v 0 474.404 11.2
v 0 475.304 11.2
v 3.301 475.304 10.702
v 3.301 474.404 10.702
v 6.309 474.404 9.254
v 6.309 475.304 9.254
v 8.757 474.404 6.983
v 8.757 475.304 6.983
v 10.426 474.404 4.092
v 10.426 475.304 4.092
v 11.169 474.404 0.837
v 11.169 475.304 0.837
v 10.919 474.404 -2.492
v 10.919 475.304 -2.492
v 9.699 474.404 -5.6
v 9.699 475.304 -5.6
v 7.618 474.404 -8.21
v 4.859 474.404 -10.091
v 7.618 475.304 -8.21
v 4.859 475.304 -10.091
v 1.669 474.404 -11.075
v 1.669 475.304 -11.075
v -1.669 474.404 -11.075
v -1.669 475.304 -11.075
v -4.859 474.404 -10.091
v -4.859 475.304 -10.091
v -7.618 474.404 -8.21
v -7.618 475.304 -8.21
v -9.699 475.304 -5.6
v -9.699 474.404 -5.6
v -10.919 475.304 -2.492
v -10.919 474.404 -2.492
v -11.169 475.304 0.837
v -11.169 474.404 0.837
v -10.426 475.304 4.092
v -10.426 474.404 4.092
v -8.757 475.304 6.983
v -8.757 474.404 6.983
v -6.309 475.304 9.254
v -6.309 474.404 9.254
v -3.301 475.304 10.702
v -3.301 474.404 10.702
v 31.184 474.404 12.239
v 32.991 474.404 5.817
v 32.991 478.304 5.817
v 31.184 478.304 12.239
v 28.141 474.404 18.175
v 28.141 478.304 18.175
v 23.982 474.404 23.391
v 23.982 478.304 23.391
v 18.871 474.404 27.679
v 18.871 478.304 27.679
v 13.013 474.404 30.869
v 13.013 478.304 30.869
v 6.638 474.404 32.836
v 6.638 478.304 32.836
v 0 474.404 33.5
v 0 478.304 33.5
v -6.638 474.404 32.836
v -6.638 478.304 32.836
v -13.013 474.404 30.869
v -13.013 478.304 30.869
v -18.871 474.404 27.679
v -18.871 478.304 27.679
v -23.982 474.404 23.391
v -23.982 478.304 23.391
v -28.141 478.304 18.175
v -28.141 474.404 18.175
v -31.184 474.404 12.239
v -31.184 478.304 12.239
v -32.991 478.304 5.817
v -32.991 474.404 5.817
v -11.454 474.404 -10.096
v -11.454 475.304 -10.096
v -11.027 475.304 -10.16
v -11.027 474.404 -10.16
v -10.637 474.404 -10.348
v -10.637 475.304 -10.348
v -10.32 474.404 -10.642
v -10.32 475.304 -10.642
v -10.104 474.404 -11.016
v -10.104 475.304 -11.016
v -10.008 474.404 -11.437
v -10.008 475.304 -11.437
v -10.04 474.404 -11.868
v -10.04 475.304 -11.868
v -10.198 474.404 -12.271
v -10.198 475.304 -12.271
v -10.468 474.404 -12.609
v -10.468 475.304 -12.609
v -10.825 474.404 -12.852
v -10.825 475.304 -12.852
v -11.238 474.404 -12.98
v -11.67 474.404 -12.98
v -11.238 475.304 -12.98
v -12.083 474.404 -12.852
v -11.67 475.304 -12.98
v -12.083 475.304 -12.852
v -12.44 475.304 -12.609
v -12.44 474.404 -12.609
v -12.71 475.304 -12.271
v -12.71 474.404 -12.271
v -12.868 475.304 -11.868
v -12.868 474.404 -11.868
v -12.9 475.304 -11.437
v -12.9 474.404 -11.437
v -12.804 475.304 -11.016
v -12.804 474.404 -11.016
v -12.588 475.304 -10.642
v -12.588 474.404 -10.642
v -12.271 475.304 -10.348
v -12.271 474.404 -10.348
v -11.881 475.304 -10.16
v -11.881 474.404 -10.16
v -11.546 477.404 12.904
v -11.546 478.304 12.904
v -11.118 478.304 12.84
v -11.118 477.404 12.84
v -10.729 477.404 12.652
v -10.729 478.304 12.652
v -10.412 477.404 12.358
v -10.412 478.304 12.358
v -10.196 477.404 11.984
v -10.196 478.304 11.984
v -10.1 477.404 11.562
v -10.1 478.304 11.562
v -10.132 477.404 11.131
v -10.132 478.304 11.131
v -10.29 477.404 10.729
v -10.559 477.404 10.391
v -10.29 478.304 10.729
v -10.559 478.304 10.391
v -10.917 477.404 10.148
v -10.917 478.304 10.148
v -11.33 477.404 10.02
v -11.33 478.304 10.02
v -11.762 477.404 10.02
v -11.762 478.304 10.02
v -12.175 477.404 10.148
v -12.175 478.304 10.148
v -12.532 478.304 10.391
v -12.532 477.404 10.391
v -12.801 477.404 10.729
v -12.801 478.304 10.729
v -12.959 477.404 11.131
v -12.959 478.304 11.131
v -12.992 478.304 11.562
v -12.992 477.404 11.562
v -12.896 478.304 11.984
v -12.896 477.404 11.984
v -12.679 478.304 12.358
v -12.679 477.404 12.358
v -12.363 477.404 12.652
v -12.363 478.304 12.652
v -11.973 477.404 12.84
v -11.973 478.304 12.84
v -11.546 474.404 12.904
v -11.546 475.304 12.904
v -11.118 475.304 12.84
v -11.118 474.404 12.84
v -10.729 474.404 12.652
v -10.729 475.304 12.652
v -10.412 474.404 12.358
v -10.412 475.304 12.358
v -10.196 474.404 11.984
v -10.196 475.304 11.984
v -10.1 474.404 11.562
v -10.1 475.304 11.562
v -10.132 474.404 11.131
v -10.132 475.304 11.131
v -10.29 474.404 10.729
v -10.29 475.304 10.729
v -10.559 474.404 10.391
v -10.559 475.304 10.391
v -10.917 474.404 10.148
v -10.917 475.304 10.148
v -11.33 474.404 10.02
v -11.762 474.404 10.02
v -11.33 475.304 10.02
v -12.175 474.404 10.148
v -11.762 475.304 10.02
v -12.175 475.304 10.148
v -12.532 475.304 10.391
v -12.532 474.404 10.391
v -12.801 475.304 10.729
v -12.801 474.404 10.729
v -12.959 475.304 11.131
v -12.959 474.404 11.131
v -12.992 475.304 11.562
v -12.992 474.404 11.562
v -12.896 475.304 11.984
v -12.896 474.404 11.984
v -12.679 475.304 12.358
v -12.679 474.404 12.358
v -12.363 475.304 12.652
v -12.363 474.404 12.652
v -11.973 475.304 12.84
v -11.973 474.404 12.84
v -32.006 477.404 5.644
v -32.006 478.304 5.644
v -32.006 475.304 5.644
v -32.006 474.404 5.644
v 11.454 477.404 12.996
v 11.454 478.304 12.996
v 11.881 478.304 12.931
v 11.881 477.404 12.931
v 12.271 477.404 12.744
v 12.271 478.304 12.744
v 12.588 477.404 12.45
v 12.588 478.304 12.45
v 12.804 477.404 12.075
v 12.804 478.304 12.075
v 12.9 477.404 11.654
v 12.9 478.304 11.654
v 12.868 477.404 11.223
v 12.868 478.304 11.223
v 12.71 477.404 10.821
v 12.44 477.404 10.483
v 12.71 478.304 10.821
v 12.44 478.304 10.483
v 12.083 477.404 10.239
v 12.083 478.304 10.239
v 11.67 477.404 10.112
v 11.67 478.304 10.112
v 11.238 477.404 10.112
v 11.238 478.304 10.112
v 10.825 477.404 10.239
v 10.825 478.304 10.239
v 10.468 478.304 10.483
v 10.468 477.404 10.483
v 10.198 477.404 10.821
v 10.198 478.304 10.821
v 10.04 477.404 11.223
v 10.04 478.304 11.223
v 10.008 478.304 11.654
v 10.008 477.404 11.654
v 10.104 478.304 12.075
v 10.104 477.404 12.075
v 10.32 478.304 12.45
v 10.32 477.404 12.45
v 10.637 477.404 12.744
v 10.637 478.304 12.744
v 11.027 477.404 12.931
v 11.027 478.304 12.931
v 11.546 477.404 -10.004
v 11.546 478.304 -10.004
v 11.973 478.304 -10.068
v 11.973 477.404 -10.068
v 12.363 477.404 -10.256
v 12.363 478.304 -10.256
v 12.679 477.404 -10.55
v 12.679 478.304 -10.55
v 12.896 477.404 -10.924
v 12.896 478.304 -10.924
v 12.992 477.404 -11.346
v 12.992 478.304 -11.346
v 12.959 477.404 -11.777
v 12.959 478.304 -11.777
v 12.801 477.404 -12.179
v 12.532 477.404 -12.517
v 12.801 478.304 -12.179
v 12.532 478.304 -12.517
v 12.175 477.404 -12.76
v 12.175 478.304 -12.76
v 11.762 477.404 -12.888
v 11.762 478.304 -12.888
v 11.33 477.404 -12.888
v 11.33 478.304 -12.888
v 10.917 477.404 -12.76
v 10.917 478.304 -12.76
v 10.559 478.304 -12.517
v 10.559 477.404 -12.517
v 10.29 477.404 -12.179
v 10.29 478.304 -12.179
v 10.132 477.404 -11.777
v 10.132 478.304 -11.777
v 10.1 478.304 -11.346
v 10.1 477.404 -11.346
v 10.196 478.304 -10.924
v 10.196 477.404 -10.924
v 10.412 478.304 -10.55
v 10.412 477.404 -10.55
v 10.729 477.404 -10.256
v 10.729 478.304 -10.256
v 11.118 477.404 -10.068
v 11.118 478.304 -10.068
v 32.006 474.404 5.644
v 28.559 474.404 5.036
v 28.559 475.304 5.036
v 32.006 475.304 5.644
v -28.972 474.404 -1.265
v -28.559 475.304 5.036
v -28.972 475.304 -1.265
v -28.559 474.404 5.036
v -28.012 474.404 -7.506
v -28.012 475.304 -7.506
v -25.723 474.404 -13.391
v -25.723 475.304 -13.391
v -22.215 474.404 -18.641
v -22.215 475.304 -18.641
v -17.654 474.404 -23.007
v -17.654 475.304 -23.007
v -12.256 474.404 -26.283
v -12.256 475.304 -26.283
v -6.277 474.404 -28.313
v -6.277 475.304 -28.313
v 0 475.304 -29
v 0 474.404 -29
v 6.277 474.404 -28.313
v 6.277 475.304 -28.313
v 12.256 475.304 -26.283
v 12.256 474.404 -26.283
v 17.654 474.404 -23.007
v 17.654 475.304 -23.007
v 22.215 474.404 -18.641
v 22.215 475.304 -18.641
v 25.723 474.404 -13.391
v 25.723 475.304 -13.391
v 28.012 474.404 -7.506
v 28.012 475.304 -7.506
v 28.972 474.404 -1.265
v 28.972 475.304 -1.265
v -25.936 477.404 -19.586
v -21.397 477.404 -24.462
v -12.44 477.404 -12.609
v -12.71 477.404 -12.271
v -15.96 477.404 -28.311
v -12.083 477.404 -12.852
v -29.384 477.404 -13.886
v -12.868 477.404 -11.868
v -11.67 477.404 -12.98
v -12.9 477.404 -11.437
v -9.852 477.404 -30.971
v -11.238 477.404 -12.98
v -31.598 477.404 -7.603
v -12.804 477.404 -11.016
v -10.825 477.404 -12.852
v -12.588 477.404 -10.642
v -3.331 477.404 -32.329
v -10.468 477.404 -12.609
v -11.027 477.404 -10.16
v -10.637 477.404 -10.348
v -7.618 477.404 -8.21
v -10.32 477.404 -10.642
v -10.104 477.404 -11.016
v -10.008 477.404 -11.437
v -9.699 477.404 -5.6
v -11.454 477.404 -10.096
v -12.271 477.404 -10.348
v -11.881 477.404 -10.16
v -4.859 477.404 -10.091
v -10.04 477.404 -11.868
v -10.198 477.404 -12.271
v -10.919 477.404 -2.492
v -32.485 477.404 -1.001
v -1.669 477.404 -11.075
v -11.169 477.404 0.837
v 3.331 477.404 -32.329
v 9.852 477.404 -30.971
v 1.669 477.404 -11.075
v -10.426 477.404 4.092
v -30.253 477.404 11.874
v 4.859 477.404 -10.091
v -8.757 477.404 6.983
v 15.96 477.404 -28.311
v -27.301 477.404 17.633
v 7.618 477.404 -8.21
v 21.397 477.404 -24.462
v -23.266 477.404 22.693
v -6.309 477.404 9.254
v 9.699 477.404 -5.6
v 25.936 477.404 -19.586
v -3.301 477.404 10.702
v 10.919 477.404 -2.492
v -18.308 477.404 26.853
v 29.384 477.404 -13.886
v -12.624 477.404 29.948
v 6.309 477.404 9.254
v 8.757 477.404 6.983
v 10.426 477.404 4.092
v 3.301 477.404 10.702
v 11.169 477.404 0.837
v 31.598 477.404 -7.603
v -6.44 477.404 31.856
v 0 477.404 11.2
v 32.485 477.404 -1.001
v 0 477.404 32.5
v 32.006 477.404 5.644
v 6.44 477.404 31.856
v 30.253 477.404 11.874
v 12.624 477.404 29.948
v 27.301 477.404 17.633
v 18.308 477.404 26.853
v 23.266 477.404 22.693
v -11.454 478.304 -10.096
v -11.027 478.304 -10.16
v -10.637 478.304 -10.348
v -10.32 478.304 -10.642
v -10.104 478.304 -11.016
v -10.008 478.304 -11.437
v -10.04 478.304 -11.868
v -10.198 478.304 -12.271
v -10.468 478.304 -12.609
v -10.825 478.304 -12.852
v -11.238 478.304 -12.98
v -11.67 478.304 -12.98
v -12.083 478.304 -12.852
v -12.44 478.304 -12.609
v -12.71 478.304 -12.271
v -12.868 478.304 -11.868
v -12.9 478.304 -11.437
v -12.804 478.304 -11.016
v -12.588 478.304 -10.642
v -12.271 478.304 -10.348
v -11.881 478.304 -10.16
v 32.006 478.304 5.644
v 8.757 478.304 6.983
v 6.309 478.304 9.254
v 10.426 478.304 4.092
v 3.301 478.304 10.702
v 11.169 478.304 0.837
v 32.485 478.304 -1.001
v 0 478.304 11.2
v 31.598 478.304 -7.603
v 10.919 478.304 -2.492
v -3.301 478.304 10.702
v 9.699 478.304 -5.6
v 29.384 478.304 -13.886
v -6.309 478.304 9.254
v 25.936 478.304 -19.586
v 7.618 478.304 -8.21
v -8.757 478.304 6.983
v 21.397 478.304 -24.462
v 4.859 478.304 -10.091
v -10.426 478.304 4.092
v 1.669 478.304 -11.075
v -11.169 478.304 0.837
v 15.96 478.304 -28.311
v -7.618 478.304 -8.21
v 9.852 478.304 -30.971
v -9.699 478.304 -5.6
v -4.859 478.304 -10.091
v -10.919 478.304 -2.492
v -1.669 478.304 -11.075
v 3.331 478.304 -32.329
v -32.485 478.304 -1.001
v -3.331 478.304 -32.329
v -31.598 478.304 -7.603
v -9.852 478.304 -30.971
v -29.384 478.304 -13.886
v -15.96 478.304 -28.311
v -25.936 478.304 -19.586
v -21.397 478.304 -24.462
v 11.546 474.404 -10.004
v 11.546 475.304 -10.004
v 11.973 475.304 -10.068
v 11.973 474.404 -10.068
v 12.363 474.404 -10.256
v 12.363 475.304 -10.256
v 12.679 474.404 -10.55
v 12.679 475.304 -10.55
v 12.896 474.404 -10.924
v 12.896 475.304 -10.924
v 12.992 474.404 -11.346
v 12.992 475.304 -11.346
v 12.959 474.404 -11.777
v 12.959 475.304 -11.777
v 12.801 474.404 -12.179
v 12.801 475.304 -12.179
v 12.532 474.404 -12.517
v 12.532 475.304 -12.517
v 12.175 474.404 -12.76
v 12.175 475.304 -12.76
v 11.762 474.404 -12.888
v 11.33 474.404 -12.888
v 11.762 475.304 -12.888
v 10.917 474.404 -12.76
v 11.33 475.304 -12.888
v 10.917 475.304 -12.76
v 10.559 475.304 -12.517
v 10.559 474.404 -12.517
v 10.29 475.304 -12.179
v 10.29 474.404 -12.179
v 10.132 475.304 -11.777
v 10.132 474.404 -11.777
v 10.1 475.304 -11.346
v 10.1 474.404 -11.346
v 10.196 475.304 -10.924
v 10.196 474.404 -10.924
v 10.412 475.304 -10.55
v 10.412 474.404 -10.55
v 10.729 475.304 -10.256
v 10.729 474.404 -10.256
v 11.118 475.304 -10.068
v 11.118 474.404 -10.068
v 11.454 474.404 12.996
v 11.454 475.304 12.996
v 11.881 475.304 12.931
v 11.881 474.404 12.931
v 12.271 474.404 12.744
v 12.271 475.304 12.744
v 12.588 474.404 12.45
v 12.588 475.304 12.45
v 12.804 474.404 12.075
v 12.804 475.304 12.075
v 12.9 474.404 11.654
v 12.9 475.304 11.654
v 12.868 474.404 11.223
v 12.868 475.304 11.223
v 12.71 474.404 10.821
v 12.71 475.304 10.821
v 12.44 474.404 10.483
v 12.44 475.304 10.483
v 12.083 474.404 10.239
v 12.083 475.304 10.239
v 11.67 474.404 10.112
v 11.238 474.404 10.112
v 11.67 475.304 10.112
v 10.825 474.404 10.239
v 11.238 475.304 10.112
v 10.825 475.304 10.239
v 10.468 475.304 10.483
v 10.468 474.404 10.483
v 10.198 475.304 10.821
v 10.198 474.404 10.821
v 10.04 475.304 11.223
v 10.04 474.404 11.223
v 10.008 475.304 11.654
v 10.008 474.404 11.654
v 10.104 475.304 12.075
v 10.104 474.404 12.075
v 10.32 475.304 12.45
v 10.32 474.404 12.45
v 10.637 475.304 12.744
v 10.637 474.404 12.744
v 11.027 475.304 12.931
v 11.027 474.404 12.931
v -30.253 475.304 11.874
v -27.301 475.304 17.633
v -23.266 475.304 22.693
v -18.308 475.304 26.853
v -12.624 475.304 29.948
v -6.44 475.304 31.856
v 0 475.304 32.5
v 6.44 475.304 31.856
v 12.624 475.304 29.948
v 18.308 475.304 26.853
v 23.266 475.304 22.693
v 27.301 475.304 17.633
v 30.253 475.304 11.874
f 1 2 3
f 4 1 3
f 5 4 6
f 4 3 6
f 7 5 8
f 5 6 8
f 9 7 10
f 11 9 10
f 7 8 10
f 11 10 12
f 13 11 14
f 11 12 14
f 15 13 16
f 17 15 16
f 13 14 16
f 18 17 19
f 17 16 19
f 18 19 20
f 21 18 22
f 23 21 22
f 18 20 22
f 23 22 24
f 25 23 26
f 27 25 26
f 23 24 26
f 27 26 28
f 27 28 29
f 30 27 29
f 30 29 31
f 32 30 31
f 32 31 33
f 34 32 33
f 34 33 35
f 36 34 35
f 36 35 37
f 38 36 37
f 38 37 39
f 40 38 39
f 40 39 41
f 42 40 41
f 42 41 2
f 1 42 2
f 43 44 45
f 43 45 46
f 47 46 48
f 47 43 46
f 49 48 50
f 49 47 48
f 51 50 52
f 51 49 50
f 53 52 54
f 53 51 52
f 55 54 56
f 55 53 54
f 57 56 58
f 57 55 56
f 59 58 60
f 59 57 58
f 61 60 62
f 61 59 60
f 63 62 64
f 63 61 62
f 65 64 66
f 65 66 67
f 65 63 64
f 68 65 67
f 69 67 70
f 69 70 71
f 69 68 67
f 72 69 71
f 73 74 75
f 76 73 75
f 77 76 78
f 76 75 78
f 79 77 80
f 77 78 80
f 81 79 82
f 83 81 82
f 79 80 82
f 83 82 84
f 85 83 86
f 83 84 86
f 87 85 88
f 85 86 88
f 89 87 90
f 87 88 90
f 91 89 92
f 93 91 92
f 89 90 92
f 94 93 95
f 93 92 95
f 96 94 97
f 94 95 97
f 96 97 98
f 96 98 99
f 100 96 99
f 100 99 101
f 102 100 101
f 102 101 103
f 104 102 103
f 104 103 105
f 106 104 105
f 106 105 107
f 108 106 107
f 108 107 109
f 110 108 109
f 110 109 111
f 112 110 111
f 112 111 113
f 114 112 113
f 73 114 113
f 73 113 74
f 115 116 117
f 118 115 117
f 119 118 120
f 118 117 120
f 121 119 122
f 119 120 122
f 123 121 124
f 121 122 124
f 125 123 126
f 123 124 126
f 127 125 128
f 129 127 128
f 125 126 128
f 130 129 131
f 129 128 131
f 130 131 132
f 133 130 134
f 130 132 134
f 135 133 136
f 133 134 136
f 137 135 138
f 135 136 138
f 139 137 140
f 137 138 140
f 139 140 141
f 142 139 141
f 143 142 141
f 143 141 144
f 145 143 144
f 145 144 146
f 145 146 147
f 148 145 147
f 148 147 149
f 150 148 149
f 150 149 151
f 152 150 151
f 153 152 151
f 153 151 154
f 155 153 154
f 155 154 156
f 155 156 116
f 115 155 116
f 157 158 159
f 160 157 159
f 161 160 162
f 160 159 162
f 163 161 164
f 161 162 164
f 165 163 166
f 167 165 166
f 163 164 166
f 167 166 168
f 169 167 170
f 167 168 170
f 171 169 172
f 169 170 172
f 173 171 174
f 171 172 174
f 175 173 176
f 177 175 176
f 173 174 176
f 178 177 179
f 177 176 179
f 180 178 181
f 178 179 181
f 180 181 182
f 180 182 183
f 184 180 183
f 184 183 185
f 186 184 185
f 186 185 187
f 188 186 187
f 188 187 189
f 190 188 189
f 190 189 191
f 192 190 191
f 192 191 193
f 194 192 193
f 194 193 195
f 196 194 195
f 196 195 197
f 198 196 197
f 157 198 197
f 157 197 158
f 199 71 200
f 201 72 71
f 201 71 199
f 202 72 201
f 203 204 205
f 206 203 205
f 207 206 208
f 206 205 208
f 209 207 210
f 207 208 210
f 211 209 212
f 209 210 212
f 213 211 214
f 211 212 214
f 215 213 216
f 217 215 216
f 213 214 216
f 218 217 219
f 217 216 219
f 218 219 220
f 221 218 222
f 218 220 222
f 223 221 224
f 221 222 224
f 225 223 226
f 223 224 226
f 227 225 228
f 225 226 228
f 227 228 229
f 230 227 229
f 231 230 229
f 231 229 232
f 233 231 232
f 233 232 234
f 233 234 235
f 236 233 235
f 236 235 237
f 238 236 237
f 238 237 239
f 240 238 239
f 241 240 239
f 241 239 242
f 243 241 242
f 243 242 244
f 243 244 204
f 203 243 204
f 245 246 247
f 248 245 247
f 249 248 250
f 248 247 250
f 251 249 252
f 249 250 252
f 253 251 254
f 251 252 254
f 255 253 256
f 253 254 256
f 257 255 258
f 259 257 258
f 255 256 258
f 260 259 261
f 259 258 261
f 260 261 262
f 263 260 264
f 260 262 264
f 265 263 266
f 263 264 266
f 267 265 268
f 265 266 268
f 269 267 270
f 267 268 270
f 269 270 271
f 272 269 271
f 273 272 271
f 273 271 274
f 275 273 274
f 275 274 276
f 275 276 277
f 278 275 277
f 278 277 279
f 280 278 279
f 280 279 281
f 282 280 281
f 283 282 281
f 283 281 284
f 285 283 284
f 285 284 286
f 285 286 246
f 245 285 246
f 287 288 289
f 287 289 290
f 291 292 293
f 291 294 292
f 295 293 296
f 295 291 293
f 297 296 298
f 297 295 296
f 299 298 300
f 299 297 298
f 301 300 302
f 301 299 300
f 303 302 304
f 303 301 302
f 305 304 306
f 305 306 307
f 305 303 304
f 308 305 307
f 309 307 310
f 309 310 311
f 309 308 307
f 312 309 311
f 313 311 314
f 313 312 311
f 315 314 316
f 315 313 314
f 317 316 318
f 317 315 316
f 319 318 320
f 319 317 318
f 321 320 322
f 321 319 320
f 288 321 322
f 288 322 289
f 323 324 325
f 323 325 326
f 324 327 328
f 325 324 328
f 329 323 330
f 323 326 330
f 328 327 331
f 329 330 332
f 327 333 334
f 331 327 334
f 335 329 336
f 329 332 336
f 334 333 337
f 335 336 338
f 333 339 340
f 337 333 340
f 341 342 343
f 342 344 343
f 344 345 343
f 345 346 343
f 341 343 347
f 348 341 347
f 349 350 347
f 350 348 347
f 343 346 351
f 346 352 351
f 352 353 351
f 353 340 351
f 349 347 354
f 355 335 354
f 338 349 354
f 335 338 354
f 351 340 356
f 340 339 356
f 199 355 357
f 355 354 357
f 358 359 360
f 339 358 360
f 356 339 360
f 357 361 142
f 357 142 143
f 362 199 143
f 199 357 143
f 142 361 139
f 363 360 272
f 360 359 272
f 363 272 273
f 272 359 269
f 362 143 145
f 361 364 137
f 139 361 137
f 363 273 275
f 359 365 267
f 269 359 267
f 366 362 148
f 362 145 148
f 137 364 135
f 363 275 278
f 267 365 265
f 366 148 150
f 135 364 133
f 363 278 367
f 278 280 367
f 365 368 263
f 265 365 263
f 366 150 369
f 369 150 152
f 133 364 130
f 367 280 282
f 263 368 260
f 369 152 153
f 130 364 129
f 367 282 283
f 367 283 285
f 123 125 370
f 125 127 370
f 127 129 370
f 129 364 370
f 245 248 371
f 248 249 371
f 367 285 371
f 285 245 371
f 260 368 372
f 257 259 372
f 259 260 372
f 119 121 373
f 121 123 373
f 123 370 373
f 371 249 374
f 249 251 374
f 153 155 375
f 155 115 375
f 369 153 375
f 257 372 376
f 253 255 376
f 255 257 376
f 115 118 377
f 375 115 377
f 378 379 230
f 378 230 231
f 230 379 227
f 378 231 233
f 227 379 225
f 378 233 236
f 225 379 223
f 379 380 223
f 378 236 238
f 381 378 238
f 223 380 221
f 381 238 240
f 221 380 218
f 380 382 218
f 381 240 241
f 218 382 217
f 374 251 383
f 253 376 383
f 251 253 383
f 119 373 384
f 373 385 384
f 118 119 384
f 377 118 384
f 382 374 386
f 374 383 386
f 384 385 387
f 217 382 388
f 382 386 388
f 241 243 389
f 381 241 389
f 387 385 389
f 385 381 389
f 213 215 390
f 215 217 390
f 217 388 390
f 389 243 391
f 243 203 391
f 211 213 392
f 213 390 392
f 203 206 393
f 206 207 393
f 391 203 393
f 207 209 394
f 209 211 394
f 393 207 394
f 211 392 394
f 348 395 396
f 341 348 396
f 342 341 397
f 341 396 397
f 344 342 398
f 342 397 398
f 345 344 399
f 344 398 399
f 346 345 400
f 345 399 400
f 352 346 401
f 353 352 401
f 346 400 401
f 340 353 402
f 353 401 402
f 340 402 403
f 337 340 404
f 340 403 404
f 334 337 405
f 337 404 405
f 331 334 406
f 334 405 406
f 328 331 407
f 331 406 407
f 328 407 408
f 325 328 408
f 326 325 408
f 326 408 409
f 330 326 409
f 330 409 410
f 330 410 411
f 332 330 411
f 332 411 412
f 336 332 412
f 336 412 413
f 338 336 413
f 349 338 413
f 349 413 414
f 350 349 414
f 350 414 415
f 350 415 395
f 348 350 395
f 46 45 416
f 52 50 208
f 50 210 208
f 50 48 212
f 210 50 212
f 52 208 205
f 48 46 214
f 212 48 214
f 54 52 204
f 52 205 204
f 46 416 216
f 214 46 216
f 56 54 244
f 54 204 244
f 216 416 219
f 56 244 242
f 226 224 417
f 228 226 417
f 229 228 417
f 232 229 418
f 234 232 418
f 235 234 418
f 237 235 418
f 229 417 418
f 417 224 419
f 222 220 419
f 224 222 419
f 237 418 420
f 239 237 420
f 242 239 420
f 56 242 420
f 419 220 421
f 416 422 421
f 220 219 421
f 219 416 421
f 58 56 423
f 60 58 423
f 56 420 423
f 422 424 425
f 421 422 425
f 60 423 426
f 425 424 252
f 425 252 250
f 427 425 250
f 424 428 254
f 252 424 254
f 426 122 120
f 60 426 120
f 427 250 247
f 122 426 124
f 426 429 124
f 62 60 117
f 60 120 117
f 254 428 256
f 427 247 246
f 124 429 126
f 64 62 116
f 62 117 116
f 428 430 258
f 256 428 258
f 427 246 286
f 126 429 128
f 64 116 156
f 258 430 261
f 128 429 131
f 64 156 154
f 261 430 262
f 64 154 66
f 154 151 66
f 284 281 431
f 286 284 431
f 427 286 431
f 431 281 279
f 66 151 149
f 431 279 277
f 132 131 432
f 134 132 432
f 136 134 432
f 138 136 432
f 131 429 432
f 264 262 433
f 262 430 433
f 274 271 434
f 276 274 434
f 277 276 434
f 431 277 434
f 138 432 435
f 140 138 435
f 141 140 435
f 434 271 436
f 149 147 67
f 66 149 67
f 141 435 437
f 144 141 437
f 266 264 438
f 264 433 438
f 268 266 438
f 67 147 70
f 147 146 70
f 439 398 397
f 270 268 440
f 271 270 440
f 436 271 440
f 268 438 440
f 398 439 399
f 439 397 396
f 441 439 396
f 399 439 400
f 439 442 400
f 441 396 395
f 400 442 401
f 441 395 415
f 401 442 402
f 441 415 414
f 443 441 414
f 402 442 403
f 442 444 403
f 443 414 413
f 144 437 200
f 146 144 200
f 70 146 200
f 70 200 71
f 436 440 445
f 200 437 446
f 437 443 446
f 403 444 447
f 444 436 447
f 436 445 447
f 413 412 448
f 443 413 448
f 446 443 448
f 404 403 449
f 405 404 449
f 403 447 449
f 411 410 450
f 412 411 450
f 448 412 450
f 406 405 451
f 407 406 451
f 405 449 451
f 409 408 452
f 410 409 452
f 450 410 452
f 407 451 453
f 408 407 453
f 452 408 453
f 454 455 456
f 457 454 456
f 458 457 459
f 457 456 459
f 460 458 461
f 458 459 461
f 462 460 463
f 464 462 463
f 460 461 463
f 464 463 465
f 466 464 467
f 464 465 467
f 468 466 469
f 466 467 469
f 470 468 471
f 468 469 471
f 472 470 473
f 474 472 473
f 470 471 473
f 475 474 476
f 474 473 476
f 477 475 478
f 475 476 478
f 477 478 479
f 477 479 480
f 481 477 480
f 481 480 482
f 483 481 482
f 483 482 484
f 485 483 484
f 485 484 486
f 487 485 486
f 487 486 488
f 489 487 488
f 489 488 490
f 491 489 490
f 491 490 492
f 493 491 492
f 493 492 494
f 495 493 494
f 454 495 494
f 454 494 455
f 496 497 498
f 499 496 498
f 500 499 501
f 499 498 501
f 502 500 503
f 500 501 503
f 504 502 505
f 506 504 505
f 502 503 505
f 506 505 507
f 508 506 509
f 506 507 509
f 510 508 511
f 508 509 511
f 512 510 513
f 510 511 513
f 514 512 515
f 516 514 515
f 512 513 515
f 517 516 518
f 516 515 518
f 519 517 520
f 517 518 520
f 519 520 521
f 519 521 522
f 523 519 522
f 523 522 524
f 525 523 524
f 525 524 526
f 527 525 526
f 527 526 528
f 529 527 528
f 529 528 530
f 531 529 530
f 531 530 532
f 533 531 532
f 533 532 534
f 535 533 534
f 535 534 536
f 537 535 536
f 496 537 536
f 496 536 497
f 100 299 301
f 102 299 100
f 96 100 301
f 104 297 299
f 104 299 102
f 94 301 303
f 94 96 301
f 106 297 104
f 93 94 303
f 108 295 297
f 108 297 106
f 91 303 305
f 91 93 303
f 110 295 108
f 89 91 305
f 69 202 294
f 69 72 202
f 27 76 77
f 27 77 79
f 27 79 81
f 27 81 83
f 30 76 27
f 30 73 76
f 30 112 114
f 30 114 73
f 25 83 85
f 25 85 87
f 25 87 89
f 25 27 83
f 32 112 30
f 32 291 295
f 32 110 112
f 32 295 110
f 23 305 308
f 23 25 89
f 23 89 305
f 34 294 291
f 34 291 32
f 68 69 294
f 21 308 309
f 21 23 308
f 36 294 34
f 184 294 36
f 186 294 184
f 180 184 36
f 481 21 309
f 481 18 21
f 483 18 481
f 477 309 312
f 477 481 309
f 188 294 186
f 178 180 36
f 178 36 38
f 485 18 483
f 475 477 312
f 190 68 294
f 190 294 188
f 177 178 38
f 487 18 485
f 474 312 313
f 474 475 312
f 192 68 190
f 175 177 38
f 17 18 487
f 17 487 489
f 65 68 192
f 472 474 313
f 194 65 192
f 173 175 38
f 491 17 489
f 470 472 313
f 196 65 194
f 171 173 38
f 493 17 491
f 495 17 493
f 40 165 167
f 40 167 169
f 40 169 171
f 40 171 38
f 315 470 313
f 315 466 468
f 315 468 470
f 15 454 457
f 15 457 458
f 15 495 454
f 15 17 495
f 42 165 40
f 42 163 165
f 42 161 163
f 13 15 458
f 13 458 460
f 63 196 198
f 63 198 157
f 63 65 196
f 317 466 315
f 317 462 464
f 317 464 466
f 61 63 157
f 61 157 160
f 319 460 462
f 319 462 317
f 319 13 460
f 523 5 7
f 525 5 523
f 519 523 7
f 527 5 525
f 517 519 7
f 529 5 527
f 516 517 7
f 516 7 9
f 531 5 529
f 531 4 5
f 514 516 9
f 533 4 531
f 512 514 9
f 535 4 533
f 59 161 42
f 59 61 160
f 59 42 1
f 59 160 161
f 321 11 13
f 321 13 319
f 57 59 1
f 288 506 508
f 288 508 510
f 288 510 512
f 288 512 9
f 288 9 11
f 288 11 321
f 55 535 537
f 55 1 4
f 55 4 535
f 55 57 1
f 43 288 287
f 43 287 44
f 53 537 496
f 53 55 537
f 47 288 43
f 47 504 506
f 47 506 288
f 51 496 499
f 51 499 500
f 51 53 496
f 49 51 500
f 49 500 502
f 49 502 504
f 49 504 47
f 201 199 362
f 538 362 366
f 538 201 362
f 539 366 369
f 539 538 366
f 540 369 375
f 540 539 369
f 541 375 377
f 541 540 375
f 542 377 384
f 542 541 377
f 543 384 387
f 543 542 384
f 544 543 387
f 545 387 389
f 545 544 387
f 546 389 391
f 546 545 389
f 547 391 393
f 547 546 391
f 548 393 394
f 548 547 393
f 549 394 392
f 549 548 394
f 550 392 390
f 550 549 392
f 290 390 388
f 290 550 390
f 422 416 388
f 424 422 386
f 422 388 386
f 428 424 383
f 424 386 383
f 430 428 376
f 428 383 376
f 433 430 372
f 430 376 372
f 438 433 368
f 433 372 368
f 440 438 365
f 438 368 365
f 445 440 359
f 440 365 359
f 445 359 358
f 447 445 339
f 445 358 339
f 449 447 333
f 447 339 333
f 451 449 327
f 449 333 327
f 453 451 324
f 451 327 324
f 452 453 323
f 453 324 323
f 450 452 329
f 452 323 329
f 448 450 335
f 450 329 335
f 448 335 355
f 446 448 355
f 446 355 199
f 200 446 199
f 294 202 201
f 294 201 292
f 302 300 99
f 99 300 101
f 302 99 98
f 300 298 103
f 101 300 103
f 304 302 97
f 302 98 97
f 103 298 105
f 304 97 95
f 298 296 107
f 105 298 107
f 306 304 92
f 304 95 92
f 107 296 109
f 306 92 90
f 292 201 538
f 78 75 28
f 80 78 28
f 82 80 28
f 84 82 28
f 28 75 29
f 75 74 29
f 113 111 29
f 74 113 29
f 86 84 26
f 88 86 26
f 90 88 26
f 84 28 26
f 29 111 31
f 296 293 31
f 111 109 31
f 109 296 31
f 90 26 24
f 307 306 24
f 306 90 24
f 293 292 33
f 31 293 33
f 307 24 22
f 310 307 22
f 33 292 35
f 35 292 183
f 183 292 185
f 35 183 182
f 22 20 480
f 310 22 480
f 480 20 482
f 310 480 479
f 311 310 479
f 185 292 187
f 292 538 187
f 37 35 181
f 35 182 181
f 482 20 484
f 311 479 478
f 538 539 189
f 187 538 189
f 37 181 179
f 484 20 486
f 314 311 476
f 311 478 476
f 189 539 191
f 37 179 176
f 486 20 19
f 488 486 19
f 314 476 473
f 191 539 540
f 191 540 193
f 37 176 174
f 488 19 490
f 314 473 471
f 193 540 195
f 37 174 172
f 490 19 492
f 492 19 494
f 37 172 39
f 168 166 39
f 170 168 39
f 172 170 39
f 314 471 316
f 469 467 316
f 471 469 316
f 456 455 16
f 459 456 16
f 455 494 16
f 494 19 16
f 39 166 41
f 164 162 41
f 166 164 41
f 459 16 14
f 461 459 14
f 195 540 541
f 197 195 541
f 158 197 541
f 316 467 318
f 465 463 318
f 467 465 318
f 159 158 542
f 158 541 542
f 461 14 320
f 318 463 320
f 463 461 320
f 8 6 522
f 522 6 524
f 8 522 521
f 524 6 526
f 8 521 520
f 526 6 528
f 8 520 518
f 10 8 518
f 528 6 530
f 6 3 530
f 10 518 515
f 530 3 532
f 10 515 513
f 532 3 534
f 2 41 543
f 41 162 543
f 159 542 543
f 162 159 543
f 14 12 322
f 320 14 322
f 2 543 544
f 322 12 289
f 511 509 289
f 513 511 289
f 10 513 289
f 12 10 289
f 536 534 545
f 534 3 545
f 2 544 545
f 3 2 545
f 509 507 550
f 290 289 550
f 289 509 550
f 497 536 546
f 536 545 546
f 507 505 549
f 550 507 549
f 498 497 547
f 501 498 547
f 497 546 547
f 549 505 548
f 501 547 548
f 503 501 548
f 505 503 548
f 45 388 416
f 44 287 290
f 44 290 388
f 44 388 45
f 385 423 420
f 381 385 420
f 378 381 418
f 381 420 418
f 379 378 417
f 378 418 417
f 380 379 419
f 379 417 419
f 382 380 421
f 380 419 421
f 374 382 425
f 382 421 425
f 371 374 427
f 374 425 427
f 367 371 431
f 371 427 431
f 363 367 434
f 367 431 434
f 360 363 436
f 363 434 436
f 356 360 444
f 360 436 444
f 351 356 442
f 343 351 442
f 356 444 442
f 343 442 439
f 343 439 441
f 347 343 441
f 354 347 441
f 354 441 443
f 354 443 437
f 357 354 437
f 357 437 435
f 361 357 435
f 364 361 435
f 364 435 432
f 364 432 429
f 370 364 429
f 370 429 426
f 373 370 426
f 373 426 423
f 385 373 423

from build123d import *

# Parameters (mm, degrees)
SKETCH_1_R          = 32.5
EXTRUDE_1_DEPTH     = 0.9
EXTRUDE_START       = -3.9
EXTRUDE_1_2_DEPTH   = 3.9
SKETCH_3_R          = 29
EXTRUDE_2_DEPTH     = 0.9
EXTRUDE_2_2_DEPTH   = 0.9
SKETCH_5_R          = 1.45
SKETCH_5_R_2        = 11.2
CUT_EXTRUDE_1_DEPTH = 3.9


with BuildPart() as part:
    # 草图1 → Extrude 1 (new body)
    with BuildSketch(Plane(origin=(0, 477.404389455, 0), x_dir=(1, 0, 0), z_dir=(0, 1, 0))):
        with Locations(Location((0, 0, 0), (0, 0, 270))):
            Circle(SKETCH_1_R)
    extrude(amount=EXTRUDE_1_DEPTH)

    # 草图2 → Extrude 1 2 (add)
    with BuildSketch(Plane(origin=(0, 478.304389455, 0), x_dir=(1, 0, 0), z_dir=(0, 1, 0)).offset(EXTRUDE_START)):
        with BuildLine():
            ThreePointArc((-32.006251973, -5.643565774), (0, -32.5), (32.006251973, -5.643565774))
            Line((32.006251973, -5.643565774), (32.991059726, -5.817213952))
            ThreePointArc((32.991059726, -5.817213952), (0, -33.5), (-32.991059726, -5.817213952))
            Line((-32.991059726, -5.817213952), (-32.006251973, -5.643565774))
        make_face()
    extrude(amount=EXTRUDE_1_2_DEPTH)



with BuildPart() as body_2:
    # 草图3 → Extrude 2 (new body)
    with BuildSketch(Plane.XZ.offset(-474.404389455)):
        with Locations(Location((0, 0, 0), (0, 0, 270))):
            Circle(SKETCH_3_R)
    extrude(amount=-EXTRUDE_2_DEPTH)


with BuildPart() as part_1:
    add(part.part)

    add(body_2.part)  # Extrude 2 2 merges body 2
    # 草图4 → Extrude 2 2 (add)
    with BuildSketch(Plane.XZ.offset(-474.404389455)):
        with BuildLine():
            ThreePointArc((32.006251973, 5.643565774), (0, 32.5), (-32.006251973, 5.643565774))
            Line((-32.006251973, 5.643565774), (-28.559424837, 5.035797152))
            ThreePointArc((-28.559424837, 5.035797152), (0, 29), (28.559424837, 5.035797152))
            Line((28.559424837, 5.035797152), (32.006251973, 5.643565774))
        make_face()
    extrude(amount=-EXTRUDE_2_2_DEPTH)

    # 草图5 → 切除-拉伸1 (cut)
    with BuildSketch(Plane(origin=(0, 478.304389455, 0), x_dir=(1, 0, 0), z_dir=(0, 1, 0))):
        with Locations(Location((11.545745571, 11.45407173, 0), (0, 0, 270))):
            Circle(SKETCH_5_R)
        with Locations(Location((11.45407173, -11.545745571, 0), (0, 0, 270))):
            Circle(SKETCH_5_R)
        with Locations(Location((-11.545745571, -11.45407173, 0), (0, 0, 270))):
            Circle(SKETCH_5_R)
        with Locations(Location((-11.45407173, 11.545745571, 0), (0, 0, 270))):
            Circle(SKETCH_5_R)
        with Locations(Location((0, 0, 0), (0, 0, 270))):
            Circle(SKETCH_5_R_2)
    extrude(amount=-CUT_EXTRUDE_1_DEPTH, mode=Mode.SUBTRACT)


solid = part_1.part
